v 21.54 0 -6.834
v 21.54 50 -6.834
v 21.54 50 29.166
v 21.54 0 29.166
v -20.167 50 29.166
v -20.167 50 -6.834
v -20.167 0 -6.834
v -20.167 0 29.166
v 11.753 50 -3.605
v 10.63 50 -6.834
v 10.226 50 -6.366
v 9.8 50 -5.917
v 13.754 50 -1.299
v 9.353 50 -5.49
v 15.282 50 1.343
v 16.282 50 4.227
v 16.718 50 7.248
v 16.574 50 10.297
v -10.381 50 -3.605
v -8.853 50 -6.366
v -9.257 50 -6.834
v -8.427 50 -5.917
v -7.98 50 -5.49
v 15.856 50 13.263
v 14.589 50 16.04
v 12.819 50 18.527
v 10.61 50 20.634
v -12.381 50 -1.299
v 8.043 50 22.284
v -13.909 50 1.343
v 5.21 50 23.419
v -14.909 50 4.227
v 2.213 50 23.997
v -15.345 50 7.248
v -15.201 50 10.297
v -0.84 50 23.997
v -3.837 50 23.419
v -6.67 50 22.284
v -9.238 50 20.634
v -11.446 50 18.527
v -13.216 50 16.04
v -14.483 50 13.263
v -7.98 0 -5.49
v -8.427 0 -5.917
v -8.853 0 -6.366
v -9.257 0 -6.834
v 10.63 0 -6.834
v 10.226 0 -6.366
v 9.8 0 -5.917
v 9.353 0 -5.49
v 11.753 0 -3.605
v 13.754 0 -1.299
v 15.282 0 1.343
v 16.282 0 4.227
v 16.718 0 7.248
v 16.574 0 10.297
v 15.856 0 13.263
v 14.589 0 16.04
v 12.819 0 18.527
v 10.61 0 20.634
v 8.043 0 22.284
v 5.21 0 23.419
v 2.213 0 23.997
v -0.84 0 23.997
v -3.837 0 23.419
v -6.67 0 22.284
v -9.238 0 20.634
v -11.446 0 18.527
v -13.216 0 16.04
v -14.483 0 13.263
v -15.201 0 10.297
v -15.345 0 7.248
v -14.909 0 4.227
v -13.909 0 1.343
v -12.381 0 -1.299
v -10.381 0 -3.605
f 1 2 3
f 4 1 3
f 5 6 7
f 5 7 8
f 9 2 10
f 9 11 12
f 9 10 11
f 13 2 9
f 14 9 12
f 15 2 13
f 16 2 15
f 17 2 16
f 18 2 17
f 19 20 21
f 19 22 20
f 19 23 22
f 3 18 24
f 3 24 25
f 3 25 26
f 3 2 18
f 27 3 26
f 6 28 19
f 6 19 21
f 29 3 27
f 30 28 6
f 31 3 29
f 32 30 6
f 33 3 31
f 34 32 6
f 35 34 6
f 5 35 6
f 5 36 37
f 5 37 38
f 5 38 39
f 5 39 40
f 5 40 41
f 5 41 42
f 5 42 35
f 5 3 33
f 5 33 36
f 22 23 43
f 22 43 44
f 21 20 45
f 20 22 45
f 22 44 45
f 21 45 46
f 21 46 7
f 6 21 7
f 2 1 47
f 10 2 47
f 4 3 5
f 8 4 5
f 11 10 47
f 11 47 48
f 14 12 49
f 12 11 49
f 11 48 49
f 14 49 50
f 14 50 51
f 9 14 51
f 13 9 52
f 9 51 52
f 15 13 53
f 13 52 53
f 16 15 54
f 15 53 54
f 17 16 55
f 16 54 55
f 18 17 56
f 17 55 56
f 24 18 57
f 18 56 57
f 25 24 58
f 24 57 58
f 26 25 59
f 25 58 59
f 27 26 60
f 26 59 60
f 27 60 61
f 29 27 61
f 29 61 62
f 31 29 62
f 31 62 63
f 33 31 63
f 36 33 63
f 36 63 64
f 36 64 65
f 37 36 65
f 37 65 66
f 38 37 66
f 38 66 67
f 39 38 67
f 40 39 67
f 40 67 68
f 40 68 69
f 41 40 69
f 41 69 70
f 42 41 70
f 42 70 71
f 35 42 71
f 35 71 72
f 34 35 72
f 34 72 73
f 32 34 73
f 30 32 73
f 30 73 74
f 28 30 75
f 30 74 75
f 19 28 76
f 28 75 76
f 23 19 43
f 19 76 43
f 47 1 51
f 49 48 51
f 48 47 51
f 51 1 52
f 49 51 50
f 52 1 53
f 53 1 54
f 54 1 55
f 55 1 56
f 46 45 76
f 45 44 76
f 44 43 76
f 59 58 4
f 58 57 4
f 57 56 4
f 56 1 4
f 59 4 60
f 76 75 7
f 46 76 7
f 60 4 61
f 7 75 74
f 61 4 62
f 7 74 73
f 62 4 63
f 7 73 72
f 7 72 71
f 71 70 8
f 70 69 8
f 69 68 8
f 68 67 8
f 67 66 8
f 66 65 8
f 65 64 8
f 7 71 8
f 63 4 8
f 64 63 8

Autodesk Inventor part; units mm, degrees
ref_plane "YZ Plane" through (0, 0, 0) normal (1, 0, 0) x (0, 1, 0)
ref_plane "XZ Plane" through (0, 0, 0) normal (0, 1, 0) x (-1, 0, 0)
ref_plane "XY Plane" through (0, 0, 0) normal (0, 0, 1) x (1, 0, 0)
sketch "Sketch1" plane through (0, 0, 0) normal (0, 1, 0) x (-1, 0, 0)
  line L0 (-23.54, 18.8125) -> (-23.54, -4.7733)
  line L1 (-23.54, 18.8125) -> (-23.54, 29.166)
  line L2 (-23.54, 29.166) -> (22.1671, 29.166)
  line L3 (22.1671, 29.166) -> (22.1671, -6.834)
  line L4 (18.6136, -6.834) -> (20.1065, -6.834)
  line L5 (22.1671, -4.7733) -> (22.1671, 18.8125)
  line L6 (-22.4793, 29.166) -> (21.1065, 29.166)
  line L7 (-23.54, 18.8125) -> (-23.54, -6.834)
  line L8 (-23.54, -6.834) -> (22.1671, -6.834)
  circle A0 centre (-0.6864, 8.0196) radius 16.05
  line L9 (-23.54, 29.166) -> (22.1671, 29.166)
  line L10 (22.1671, 29.166) -> (22.1671, 20.7196)
  line L11 (22.1671, 20.7196) -> (-23.54, 20.7196)
  line L12 (-23.54, 20.7196) -> (-23.54, 29.166)
  circle A1 centre (-0.6864, -15) radius 12.8668
  point P0 (0, 0)
  point P1 (7.98, -5.4895)
  point P2 (9.257, -6.834)
  point P3 (22.1671, 20.7196)
  point P4 (-23.54, 20.7196)
  point P5 (-23.54, -4.7733)
  point P6 (-10.6298, -6.834)
  point P7 (-9.3528, -5.4895)
  dimension "d0" = 0
  dimension "d1" = 32.1
  dimension "d2" = 0
  dimension "d3" = 0
extrude "Extrusion1" add sketch "Sketch1" along normal blind 50 contours L1 L11 A0 A1 L8 L7 L0 | L1 L2 L3 L11 A0 | L11 L3 L8 L4 A1 A0
sketch "Sketch5" plane through (0, 50, 0) normal (0, 1, 0) x (1, 0, 0)
  line L0 (23.54, -29.166) -> (23.54, 6.834) projected
  line L1 (23.54, 6.834) -> (21.54, 6.834)
  line L2 (21.54, 6.834) -> (21.54, -29.166)
  line L3 (21.54, -29.166) -> (23.54, -29.166)
  line L4 (23.54, -29.166) -> (23.54, 6.834)
  line L5 (-22.1671, 6.834) -> (-22.1671, -29.166) projected
  line L6 (-22.1671, 6.834) -> (-20.1671, 6.834)
  line L7 (-20.1671, 6.834) -> (-20.1671, -29.166)
  line L8 (-20.1671, -29.166) -> (-22.1671, -29.166)
  line L9 (-22.1671, -29.166) -> (-22.1671, 6.834)
  point P0 (0, 0)
  dimension "d16" = 2
  dimension "d17" = 2
extrude "Extrusion3" cut sketch "Sketch5" against normal blind 100
properties part number "SBR20_BearingBlock"
